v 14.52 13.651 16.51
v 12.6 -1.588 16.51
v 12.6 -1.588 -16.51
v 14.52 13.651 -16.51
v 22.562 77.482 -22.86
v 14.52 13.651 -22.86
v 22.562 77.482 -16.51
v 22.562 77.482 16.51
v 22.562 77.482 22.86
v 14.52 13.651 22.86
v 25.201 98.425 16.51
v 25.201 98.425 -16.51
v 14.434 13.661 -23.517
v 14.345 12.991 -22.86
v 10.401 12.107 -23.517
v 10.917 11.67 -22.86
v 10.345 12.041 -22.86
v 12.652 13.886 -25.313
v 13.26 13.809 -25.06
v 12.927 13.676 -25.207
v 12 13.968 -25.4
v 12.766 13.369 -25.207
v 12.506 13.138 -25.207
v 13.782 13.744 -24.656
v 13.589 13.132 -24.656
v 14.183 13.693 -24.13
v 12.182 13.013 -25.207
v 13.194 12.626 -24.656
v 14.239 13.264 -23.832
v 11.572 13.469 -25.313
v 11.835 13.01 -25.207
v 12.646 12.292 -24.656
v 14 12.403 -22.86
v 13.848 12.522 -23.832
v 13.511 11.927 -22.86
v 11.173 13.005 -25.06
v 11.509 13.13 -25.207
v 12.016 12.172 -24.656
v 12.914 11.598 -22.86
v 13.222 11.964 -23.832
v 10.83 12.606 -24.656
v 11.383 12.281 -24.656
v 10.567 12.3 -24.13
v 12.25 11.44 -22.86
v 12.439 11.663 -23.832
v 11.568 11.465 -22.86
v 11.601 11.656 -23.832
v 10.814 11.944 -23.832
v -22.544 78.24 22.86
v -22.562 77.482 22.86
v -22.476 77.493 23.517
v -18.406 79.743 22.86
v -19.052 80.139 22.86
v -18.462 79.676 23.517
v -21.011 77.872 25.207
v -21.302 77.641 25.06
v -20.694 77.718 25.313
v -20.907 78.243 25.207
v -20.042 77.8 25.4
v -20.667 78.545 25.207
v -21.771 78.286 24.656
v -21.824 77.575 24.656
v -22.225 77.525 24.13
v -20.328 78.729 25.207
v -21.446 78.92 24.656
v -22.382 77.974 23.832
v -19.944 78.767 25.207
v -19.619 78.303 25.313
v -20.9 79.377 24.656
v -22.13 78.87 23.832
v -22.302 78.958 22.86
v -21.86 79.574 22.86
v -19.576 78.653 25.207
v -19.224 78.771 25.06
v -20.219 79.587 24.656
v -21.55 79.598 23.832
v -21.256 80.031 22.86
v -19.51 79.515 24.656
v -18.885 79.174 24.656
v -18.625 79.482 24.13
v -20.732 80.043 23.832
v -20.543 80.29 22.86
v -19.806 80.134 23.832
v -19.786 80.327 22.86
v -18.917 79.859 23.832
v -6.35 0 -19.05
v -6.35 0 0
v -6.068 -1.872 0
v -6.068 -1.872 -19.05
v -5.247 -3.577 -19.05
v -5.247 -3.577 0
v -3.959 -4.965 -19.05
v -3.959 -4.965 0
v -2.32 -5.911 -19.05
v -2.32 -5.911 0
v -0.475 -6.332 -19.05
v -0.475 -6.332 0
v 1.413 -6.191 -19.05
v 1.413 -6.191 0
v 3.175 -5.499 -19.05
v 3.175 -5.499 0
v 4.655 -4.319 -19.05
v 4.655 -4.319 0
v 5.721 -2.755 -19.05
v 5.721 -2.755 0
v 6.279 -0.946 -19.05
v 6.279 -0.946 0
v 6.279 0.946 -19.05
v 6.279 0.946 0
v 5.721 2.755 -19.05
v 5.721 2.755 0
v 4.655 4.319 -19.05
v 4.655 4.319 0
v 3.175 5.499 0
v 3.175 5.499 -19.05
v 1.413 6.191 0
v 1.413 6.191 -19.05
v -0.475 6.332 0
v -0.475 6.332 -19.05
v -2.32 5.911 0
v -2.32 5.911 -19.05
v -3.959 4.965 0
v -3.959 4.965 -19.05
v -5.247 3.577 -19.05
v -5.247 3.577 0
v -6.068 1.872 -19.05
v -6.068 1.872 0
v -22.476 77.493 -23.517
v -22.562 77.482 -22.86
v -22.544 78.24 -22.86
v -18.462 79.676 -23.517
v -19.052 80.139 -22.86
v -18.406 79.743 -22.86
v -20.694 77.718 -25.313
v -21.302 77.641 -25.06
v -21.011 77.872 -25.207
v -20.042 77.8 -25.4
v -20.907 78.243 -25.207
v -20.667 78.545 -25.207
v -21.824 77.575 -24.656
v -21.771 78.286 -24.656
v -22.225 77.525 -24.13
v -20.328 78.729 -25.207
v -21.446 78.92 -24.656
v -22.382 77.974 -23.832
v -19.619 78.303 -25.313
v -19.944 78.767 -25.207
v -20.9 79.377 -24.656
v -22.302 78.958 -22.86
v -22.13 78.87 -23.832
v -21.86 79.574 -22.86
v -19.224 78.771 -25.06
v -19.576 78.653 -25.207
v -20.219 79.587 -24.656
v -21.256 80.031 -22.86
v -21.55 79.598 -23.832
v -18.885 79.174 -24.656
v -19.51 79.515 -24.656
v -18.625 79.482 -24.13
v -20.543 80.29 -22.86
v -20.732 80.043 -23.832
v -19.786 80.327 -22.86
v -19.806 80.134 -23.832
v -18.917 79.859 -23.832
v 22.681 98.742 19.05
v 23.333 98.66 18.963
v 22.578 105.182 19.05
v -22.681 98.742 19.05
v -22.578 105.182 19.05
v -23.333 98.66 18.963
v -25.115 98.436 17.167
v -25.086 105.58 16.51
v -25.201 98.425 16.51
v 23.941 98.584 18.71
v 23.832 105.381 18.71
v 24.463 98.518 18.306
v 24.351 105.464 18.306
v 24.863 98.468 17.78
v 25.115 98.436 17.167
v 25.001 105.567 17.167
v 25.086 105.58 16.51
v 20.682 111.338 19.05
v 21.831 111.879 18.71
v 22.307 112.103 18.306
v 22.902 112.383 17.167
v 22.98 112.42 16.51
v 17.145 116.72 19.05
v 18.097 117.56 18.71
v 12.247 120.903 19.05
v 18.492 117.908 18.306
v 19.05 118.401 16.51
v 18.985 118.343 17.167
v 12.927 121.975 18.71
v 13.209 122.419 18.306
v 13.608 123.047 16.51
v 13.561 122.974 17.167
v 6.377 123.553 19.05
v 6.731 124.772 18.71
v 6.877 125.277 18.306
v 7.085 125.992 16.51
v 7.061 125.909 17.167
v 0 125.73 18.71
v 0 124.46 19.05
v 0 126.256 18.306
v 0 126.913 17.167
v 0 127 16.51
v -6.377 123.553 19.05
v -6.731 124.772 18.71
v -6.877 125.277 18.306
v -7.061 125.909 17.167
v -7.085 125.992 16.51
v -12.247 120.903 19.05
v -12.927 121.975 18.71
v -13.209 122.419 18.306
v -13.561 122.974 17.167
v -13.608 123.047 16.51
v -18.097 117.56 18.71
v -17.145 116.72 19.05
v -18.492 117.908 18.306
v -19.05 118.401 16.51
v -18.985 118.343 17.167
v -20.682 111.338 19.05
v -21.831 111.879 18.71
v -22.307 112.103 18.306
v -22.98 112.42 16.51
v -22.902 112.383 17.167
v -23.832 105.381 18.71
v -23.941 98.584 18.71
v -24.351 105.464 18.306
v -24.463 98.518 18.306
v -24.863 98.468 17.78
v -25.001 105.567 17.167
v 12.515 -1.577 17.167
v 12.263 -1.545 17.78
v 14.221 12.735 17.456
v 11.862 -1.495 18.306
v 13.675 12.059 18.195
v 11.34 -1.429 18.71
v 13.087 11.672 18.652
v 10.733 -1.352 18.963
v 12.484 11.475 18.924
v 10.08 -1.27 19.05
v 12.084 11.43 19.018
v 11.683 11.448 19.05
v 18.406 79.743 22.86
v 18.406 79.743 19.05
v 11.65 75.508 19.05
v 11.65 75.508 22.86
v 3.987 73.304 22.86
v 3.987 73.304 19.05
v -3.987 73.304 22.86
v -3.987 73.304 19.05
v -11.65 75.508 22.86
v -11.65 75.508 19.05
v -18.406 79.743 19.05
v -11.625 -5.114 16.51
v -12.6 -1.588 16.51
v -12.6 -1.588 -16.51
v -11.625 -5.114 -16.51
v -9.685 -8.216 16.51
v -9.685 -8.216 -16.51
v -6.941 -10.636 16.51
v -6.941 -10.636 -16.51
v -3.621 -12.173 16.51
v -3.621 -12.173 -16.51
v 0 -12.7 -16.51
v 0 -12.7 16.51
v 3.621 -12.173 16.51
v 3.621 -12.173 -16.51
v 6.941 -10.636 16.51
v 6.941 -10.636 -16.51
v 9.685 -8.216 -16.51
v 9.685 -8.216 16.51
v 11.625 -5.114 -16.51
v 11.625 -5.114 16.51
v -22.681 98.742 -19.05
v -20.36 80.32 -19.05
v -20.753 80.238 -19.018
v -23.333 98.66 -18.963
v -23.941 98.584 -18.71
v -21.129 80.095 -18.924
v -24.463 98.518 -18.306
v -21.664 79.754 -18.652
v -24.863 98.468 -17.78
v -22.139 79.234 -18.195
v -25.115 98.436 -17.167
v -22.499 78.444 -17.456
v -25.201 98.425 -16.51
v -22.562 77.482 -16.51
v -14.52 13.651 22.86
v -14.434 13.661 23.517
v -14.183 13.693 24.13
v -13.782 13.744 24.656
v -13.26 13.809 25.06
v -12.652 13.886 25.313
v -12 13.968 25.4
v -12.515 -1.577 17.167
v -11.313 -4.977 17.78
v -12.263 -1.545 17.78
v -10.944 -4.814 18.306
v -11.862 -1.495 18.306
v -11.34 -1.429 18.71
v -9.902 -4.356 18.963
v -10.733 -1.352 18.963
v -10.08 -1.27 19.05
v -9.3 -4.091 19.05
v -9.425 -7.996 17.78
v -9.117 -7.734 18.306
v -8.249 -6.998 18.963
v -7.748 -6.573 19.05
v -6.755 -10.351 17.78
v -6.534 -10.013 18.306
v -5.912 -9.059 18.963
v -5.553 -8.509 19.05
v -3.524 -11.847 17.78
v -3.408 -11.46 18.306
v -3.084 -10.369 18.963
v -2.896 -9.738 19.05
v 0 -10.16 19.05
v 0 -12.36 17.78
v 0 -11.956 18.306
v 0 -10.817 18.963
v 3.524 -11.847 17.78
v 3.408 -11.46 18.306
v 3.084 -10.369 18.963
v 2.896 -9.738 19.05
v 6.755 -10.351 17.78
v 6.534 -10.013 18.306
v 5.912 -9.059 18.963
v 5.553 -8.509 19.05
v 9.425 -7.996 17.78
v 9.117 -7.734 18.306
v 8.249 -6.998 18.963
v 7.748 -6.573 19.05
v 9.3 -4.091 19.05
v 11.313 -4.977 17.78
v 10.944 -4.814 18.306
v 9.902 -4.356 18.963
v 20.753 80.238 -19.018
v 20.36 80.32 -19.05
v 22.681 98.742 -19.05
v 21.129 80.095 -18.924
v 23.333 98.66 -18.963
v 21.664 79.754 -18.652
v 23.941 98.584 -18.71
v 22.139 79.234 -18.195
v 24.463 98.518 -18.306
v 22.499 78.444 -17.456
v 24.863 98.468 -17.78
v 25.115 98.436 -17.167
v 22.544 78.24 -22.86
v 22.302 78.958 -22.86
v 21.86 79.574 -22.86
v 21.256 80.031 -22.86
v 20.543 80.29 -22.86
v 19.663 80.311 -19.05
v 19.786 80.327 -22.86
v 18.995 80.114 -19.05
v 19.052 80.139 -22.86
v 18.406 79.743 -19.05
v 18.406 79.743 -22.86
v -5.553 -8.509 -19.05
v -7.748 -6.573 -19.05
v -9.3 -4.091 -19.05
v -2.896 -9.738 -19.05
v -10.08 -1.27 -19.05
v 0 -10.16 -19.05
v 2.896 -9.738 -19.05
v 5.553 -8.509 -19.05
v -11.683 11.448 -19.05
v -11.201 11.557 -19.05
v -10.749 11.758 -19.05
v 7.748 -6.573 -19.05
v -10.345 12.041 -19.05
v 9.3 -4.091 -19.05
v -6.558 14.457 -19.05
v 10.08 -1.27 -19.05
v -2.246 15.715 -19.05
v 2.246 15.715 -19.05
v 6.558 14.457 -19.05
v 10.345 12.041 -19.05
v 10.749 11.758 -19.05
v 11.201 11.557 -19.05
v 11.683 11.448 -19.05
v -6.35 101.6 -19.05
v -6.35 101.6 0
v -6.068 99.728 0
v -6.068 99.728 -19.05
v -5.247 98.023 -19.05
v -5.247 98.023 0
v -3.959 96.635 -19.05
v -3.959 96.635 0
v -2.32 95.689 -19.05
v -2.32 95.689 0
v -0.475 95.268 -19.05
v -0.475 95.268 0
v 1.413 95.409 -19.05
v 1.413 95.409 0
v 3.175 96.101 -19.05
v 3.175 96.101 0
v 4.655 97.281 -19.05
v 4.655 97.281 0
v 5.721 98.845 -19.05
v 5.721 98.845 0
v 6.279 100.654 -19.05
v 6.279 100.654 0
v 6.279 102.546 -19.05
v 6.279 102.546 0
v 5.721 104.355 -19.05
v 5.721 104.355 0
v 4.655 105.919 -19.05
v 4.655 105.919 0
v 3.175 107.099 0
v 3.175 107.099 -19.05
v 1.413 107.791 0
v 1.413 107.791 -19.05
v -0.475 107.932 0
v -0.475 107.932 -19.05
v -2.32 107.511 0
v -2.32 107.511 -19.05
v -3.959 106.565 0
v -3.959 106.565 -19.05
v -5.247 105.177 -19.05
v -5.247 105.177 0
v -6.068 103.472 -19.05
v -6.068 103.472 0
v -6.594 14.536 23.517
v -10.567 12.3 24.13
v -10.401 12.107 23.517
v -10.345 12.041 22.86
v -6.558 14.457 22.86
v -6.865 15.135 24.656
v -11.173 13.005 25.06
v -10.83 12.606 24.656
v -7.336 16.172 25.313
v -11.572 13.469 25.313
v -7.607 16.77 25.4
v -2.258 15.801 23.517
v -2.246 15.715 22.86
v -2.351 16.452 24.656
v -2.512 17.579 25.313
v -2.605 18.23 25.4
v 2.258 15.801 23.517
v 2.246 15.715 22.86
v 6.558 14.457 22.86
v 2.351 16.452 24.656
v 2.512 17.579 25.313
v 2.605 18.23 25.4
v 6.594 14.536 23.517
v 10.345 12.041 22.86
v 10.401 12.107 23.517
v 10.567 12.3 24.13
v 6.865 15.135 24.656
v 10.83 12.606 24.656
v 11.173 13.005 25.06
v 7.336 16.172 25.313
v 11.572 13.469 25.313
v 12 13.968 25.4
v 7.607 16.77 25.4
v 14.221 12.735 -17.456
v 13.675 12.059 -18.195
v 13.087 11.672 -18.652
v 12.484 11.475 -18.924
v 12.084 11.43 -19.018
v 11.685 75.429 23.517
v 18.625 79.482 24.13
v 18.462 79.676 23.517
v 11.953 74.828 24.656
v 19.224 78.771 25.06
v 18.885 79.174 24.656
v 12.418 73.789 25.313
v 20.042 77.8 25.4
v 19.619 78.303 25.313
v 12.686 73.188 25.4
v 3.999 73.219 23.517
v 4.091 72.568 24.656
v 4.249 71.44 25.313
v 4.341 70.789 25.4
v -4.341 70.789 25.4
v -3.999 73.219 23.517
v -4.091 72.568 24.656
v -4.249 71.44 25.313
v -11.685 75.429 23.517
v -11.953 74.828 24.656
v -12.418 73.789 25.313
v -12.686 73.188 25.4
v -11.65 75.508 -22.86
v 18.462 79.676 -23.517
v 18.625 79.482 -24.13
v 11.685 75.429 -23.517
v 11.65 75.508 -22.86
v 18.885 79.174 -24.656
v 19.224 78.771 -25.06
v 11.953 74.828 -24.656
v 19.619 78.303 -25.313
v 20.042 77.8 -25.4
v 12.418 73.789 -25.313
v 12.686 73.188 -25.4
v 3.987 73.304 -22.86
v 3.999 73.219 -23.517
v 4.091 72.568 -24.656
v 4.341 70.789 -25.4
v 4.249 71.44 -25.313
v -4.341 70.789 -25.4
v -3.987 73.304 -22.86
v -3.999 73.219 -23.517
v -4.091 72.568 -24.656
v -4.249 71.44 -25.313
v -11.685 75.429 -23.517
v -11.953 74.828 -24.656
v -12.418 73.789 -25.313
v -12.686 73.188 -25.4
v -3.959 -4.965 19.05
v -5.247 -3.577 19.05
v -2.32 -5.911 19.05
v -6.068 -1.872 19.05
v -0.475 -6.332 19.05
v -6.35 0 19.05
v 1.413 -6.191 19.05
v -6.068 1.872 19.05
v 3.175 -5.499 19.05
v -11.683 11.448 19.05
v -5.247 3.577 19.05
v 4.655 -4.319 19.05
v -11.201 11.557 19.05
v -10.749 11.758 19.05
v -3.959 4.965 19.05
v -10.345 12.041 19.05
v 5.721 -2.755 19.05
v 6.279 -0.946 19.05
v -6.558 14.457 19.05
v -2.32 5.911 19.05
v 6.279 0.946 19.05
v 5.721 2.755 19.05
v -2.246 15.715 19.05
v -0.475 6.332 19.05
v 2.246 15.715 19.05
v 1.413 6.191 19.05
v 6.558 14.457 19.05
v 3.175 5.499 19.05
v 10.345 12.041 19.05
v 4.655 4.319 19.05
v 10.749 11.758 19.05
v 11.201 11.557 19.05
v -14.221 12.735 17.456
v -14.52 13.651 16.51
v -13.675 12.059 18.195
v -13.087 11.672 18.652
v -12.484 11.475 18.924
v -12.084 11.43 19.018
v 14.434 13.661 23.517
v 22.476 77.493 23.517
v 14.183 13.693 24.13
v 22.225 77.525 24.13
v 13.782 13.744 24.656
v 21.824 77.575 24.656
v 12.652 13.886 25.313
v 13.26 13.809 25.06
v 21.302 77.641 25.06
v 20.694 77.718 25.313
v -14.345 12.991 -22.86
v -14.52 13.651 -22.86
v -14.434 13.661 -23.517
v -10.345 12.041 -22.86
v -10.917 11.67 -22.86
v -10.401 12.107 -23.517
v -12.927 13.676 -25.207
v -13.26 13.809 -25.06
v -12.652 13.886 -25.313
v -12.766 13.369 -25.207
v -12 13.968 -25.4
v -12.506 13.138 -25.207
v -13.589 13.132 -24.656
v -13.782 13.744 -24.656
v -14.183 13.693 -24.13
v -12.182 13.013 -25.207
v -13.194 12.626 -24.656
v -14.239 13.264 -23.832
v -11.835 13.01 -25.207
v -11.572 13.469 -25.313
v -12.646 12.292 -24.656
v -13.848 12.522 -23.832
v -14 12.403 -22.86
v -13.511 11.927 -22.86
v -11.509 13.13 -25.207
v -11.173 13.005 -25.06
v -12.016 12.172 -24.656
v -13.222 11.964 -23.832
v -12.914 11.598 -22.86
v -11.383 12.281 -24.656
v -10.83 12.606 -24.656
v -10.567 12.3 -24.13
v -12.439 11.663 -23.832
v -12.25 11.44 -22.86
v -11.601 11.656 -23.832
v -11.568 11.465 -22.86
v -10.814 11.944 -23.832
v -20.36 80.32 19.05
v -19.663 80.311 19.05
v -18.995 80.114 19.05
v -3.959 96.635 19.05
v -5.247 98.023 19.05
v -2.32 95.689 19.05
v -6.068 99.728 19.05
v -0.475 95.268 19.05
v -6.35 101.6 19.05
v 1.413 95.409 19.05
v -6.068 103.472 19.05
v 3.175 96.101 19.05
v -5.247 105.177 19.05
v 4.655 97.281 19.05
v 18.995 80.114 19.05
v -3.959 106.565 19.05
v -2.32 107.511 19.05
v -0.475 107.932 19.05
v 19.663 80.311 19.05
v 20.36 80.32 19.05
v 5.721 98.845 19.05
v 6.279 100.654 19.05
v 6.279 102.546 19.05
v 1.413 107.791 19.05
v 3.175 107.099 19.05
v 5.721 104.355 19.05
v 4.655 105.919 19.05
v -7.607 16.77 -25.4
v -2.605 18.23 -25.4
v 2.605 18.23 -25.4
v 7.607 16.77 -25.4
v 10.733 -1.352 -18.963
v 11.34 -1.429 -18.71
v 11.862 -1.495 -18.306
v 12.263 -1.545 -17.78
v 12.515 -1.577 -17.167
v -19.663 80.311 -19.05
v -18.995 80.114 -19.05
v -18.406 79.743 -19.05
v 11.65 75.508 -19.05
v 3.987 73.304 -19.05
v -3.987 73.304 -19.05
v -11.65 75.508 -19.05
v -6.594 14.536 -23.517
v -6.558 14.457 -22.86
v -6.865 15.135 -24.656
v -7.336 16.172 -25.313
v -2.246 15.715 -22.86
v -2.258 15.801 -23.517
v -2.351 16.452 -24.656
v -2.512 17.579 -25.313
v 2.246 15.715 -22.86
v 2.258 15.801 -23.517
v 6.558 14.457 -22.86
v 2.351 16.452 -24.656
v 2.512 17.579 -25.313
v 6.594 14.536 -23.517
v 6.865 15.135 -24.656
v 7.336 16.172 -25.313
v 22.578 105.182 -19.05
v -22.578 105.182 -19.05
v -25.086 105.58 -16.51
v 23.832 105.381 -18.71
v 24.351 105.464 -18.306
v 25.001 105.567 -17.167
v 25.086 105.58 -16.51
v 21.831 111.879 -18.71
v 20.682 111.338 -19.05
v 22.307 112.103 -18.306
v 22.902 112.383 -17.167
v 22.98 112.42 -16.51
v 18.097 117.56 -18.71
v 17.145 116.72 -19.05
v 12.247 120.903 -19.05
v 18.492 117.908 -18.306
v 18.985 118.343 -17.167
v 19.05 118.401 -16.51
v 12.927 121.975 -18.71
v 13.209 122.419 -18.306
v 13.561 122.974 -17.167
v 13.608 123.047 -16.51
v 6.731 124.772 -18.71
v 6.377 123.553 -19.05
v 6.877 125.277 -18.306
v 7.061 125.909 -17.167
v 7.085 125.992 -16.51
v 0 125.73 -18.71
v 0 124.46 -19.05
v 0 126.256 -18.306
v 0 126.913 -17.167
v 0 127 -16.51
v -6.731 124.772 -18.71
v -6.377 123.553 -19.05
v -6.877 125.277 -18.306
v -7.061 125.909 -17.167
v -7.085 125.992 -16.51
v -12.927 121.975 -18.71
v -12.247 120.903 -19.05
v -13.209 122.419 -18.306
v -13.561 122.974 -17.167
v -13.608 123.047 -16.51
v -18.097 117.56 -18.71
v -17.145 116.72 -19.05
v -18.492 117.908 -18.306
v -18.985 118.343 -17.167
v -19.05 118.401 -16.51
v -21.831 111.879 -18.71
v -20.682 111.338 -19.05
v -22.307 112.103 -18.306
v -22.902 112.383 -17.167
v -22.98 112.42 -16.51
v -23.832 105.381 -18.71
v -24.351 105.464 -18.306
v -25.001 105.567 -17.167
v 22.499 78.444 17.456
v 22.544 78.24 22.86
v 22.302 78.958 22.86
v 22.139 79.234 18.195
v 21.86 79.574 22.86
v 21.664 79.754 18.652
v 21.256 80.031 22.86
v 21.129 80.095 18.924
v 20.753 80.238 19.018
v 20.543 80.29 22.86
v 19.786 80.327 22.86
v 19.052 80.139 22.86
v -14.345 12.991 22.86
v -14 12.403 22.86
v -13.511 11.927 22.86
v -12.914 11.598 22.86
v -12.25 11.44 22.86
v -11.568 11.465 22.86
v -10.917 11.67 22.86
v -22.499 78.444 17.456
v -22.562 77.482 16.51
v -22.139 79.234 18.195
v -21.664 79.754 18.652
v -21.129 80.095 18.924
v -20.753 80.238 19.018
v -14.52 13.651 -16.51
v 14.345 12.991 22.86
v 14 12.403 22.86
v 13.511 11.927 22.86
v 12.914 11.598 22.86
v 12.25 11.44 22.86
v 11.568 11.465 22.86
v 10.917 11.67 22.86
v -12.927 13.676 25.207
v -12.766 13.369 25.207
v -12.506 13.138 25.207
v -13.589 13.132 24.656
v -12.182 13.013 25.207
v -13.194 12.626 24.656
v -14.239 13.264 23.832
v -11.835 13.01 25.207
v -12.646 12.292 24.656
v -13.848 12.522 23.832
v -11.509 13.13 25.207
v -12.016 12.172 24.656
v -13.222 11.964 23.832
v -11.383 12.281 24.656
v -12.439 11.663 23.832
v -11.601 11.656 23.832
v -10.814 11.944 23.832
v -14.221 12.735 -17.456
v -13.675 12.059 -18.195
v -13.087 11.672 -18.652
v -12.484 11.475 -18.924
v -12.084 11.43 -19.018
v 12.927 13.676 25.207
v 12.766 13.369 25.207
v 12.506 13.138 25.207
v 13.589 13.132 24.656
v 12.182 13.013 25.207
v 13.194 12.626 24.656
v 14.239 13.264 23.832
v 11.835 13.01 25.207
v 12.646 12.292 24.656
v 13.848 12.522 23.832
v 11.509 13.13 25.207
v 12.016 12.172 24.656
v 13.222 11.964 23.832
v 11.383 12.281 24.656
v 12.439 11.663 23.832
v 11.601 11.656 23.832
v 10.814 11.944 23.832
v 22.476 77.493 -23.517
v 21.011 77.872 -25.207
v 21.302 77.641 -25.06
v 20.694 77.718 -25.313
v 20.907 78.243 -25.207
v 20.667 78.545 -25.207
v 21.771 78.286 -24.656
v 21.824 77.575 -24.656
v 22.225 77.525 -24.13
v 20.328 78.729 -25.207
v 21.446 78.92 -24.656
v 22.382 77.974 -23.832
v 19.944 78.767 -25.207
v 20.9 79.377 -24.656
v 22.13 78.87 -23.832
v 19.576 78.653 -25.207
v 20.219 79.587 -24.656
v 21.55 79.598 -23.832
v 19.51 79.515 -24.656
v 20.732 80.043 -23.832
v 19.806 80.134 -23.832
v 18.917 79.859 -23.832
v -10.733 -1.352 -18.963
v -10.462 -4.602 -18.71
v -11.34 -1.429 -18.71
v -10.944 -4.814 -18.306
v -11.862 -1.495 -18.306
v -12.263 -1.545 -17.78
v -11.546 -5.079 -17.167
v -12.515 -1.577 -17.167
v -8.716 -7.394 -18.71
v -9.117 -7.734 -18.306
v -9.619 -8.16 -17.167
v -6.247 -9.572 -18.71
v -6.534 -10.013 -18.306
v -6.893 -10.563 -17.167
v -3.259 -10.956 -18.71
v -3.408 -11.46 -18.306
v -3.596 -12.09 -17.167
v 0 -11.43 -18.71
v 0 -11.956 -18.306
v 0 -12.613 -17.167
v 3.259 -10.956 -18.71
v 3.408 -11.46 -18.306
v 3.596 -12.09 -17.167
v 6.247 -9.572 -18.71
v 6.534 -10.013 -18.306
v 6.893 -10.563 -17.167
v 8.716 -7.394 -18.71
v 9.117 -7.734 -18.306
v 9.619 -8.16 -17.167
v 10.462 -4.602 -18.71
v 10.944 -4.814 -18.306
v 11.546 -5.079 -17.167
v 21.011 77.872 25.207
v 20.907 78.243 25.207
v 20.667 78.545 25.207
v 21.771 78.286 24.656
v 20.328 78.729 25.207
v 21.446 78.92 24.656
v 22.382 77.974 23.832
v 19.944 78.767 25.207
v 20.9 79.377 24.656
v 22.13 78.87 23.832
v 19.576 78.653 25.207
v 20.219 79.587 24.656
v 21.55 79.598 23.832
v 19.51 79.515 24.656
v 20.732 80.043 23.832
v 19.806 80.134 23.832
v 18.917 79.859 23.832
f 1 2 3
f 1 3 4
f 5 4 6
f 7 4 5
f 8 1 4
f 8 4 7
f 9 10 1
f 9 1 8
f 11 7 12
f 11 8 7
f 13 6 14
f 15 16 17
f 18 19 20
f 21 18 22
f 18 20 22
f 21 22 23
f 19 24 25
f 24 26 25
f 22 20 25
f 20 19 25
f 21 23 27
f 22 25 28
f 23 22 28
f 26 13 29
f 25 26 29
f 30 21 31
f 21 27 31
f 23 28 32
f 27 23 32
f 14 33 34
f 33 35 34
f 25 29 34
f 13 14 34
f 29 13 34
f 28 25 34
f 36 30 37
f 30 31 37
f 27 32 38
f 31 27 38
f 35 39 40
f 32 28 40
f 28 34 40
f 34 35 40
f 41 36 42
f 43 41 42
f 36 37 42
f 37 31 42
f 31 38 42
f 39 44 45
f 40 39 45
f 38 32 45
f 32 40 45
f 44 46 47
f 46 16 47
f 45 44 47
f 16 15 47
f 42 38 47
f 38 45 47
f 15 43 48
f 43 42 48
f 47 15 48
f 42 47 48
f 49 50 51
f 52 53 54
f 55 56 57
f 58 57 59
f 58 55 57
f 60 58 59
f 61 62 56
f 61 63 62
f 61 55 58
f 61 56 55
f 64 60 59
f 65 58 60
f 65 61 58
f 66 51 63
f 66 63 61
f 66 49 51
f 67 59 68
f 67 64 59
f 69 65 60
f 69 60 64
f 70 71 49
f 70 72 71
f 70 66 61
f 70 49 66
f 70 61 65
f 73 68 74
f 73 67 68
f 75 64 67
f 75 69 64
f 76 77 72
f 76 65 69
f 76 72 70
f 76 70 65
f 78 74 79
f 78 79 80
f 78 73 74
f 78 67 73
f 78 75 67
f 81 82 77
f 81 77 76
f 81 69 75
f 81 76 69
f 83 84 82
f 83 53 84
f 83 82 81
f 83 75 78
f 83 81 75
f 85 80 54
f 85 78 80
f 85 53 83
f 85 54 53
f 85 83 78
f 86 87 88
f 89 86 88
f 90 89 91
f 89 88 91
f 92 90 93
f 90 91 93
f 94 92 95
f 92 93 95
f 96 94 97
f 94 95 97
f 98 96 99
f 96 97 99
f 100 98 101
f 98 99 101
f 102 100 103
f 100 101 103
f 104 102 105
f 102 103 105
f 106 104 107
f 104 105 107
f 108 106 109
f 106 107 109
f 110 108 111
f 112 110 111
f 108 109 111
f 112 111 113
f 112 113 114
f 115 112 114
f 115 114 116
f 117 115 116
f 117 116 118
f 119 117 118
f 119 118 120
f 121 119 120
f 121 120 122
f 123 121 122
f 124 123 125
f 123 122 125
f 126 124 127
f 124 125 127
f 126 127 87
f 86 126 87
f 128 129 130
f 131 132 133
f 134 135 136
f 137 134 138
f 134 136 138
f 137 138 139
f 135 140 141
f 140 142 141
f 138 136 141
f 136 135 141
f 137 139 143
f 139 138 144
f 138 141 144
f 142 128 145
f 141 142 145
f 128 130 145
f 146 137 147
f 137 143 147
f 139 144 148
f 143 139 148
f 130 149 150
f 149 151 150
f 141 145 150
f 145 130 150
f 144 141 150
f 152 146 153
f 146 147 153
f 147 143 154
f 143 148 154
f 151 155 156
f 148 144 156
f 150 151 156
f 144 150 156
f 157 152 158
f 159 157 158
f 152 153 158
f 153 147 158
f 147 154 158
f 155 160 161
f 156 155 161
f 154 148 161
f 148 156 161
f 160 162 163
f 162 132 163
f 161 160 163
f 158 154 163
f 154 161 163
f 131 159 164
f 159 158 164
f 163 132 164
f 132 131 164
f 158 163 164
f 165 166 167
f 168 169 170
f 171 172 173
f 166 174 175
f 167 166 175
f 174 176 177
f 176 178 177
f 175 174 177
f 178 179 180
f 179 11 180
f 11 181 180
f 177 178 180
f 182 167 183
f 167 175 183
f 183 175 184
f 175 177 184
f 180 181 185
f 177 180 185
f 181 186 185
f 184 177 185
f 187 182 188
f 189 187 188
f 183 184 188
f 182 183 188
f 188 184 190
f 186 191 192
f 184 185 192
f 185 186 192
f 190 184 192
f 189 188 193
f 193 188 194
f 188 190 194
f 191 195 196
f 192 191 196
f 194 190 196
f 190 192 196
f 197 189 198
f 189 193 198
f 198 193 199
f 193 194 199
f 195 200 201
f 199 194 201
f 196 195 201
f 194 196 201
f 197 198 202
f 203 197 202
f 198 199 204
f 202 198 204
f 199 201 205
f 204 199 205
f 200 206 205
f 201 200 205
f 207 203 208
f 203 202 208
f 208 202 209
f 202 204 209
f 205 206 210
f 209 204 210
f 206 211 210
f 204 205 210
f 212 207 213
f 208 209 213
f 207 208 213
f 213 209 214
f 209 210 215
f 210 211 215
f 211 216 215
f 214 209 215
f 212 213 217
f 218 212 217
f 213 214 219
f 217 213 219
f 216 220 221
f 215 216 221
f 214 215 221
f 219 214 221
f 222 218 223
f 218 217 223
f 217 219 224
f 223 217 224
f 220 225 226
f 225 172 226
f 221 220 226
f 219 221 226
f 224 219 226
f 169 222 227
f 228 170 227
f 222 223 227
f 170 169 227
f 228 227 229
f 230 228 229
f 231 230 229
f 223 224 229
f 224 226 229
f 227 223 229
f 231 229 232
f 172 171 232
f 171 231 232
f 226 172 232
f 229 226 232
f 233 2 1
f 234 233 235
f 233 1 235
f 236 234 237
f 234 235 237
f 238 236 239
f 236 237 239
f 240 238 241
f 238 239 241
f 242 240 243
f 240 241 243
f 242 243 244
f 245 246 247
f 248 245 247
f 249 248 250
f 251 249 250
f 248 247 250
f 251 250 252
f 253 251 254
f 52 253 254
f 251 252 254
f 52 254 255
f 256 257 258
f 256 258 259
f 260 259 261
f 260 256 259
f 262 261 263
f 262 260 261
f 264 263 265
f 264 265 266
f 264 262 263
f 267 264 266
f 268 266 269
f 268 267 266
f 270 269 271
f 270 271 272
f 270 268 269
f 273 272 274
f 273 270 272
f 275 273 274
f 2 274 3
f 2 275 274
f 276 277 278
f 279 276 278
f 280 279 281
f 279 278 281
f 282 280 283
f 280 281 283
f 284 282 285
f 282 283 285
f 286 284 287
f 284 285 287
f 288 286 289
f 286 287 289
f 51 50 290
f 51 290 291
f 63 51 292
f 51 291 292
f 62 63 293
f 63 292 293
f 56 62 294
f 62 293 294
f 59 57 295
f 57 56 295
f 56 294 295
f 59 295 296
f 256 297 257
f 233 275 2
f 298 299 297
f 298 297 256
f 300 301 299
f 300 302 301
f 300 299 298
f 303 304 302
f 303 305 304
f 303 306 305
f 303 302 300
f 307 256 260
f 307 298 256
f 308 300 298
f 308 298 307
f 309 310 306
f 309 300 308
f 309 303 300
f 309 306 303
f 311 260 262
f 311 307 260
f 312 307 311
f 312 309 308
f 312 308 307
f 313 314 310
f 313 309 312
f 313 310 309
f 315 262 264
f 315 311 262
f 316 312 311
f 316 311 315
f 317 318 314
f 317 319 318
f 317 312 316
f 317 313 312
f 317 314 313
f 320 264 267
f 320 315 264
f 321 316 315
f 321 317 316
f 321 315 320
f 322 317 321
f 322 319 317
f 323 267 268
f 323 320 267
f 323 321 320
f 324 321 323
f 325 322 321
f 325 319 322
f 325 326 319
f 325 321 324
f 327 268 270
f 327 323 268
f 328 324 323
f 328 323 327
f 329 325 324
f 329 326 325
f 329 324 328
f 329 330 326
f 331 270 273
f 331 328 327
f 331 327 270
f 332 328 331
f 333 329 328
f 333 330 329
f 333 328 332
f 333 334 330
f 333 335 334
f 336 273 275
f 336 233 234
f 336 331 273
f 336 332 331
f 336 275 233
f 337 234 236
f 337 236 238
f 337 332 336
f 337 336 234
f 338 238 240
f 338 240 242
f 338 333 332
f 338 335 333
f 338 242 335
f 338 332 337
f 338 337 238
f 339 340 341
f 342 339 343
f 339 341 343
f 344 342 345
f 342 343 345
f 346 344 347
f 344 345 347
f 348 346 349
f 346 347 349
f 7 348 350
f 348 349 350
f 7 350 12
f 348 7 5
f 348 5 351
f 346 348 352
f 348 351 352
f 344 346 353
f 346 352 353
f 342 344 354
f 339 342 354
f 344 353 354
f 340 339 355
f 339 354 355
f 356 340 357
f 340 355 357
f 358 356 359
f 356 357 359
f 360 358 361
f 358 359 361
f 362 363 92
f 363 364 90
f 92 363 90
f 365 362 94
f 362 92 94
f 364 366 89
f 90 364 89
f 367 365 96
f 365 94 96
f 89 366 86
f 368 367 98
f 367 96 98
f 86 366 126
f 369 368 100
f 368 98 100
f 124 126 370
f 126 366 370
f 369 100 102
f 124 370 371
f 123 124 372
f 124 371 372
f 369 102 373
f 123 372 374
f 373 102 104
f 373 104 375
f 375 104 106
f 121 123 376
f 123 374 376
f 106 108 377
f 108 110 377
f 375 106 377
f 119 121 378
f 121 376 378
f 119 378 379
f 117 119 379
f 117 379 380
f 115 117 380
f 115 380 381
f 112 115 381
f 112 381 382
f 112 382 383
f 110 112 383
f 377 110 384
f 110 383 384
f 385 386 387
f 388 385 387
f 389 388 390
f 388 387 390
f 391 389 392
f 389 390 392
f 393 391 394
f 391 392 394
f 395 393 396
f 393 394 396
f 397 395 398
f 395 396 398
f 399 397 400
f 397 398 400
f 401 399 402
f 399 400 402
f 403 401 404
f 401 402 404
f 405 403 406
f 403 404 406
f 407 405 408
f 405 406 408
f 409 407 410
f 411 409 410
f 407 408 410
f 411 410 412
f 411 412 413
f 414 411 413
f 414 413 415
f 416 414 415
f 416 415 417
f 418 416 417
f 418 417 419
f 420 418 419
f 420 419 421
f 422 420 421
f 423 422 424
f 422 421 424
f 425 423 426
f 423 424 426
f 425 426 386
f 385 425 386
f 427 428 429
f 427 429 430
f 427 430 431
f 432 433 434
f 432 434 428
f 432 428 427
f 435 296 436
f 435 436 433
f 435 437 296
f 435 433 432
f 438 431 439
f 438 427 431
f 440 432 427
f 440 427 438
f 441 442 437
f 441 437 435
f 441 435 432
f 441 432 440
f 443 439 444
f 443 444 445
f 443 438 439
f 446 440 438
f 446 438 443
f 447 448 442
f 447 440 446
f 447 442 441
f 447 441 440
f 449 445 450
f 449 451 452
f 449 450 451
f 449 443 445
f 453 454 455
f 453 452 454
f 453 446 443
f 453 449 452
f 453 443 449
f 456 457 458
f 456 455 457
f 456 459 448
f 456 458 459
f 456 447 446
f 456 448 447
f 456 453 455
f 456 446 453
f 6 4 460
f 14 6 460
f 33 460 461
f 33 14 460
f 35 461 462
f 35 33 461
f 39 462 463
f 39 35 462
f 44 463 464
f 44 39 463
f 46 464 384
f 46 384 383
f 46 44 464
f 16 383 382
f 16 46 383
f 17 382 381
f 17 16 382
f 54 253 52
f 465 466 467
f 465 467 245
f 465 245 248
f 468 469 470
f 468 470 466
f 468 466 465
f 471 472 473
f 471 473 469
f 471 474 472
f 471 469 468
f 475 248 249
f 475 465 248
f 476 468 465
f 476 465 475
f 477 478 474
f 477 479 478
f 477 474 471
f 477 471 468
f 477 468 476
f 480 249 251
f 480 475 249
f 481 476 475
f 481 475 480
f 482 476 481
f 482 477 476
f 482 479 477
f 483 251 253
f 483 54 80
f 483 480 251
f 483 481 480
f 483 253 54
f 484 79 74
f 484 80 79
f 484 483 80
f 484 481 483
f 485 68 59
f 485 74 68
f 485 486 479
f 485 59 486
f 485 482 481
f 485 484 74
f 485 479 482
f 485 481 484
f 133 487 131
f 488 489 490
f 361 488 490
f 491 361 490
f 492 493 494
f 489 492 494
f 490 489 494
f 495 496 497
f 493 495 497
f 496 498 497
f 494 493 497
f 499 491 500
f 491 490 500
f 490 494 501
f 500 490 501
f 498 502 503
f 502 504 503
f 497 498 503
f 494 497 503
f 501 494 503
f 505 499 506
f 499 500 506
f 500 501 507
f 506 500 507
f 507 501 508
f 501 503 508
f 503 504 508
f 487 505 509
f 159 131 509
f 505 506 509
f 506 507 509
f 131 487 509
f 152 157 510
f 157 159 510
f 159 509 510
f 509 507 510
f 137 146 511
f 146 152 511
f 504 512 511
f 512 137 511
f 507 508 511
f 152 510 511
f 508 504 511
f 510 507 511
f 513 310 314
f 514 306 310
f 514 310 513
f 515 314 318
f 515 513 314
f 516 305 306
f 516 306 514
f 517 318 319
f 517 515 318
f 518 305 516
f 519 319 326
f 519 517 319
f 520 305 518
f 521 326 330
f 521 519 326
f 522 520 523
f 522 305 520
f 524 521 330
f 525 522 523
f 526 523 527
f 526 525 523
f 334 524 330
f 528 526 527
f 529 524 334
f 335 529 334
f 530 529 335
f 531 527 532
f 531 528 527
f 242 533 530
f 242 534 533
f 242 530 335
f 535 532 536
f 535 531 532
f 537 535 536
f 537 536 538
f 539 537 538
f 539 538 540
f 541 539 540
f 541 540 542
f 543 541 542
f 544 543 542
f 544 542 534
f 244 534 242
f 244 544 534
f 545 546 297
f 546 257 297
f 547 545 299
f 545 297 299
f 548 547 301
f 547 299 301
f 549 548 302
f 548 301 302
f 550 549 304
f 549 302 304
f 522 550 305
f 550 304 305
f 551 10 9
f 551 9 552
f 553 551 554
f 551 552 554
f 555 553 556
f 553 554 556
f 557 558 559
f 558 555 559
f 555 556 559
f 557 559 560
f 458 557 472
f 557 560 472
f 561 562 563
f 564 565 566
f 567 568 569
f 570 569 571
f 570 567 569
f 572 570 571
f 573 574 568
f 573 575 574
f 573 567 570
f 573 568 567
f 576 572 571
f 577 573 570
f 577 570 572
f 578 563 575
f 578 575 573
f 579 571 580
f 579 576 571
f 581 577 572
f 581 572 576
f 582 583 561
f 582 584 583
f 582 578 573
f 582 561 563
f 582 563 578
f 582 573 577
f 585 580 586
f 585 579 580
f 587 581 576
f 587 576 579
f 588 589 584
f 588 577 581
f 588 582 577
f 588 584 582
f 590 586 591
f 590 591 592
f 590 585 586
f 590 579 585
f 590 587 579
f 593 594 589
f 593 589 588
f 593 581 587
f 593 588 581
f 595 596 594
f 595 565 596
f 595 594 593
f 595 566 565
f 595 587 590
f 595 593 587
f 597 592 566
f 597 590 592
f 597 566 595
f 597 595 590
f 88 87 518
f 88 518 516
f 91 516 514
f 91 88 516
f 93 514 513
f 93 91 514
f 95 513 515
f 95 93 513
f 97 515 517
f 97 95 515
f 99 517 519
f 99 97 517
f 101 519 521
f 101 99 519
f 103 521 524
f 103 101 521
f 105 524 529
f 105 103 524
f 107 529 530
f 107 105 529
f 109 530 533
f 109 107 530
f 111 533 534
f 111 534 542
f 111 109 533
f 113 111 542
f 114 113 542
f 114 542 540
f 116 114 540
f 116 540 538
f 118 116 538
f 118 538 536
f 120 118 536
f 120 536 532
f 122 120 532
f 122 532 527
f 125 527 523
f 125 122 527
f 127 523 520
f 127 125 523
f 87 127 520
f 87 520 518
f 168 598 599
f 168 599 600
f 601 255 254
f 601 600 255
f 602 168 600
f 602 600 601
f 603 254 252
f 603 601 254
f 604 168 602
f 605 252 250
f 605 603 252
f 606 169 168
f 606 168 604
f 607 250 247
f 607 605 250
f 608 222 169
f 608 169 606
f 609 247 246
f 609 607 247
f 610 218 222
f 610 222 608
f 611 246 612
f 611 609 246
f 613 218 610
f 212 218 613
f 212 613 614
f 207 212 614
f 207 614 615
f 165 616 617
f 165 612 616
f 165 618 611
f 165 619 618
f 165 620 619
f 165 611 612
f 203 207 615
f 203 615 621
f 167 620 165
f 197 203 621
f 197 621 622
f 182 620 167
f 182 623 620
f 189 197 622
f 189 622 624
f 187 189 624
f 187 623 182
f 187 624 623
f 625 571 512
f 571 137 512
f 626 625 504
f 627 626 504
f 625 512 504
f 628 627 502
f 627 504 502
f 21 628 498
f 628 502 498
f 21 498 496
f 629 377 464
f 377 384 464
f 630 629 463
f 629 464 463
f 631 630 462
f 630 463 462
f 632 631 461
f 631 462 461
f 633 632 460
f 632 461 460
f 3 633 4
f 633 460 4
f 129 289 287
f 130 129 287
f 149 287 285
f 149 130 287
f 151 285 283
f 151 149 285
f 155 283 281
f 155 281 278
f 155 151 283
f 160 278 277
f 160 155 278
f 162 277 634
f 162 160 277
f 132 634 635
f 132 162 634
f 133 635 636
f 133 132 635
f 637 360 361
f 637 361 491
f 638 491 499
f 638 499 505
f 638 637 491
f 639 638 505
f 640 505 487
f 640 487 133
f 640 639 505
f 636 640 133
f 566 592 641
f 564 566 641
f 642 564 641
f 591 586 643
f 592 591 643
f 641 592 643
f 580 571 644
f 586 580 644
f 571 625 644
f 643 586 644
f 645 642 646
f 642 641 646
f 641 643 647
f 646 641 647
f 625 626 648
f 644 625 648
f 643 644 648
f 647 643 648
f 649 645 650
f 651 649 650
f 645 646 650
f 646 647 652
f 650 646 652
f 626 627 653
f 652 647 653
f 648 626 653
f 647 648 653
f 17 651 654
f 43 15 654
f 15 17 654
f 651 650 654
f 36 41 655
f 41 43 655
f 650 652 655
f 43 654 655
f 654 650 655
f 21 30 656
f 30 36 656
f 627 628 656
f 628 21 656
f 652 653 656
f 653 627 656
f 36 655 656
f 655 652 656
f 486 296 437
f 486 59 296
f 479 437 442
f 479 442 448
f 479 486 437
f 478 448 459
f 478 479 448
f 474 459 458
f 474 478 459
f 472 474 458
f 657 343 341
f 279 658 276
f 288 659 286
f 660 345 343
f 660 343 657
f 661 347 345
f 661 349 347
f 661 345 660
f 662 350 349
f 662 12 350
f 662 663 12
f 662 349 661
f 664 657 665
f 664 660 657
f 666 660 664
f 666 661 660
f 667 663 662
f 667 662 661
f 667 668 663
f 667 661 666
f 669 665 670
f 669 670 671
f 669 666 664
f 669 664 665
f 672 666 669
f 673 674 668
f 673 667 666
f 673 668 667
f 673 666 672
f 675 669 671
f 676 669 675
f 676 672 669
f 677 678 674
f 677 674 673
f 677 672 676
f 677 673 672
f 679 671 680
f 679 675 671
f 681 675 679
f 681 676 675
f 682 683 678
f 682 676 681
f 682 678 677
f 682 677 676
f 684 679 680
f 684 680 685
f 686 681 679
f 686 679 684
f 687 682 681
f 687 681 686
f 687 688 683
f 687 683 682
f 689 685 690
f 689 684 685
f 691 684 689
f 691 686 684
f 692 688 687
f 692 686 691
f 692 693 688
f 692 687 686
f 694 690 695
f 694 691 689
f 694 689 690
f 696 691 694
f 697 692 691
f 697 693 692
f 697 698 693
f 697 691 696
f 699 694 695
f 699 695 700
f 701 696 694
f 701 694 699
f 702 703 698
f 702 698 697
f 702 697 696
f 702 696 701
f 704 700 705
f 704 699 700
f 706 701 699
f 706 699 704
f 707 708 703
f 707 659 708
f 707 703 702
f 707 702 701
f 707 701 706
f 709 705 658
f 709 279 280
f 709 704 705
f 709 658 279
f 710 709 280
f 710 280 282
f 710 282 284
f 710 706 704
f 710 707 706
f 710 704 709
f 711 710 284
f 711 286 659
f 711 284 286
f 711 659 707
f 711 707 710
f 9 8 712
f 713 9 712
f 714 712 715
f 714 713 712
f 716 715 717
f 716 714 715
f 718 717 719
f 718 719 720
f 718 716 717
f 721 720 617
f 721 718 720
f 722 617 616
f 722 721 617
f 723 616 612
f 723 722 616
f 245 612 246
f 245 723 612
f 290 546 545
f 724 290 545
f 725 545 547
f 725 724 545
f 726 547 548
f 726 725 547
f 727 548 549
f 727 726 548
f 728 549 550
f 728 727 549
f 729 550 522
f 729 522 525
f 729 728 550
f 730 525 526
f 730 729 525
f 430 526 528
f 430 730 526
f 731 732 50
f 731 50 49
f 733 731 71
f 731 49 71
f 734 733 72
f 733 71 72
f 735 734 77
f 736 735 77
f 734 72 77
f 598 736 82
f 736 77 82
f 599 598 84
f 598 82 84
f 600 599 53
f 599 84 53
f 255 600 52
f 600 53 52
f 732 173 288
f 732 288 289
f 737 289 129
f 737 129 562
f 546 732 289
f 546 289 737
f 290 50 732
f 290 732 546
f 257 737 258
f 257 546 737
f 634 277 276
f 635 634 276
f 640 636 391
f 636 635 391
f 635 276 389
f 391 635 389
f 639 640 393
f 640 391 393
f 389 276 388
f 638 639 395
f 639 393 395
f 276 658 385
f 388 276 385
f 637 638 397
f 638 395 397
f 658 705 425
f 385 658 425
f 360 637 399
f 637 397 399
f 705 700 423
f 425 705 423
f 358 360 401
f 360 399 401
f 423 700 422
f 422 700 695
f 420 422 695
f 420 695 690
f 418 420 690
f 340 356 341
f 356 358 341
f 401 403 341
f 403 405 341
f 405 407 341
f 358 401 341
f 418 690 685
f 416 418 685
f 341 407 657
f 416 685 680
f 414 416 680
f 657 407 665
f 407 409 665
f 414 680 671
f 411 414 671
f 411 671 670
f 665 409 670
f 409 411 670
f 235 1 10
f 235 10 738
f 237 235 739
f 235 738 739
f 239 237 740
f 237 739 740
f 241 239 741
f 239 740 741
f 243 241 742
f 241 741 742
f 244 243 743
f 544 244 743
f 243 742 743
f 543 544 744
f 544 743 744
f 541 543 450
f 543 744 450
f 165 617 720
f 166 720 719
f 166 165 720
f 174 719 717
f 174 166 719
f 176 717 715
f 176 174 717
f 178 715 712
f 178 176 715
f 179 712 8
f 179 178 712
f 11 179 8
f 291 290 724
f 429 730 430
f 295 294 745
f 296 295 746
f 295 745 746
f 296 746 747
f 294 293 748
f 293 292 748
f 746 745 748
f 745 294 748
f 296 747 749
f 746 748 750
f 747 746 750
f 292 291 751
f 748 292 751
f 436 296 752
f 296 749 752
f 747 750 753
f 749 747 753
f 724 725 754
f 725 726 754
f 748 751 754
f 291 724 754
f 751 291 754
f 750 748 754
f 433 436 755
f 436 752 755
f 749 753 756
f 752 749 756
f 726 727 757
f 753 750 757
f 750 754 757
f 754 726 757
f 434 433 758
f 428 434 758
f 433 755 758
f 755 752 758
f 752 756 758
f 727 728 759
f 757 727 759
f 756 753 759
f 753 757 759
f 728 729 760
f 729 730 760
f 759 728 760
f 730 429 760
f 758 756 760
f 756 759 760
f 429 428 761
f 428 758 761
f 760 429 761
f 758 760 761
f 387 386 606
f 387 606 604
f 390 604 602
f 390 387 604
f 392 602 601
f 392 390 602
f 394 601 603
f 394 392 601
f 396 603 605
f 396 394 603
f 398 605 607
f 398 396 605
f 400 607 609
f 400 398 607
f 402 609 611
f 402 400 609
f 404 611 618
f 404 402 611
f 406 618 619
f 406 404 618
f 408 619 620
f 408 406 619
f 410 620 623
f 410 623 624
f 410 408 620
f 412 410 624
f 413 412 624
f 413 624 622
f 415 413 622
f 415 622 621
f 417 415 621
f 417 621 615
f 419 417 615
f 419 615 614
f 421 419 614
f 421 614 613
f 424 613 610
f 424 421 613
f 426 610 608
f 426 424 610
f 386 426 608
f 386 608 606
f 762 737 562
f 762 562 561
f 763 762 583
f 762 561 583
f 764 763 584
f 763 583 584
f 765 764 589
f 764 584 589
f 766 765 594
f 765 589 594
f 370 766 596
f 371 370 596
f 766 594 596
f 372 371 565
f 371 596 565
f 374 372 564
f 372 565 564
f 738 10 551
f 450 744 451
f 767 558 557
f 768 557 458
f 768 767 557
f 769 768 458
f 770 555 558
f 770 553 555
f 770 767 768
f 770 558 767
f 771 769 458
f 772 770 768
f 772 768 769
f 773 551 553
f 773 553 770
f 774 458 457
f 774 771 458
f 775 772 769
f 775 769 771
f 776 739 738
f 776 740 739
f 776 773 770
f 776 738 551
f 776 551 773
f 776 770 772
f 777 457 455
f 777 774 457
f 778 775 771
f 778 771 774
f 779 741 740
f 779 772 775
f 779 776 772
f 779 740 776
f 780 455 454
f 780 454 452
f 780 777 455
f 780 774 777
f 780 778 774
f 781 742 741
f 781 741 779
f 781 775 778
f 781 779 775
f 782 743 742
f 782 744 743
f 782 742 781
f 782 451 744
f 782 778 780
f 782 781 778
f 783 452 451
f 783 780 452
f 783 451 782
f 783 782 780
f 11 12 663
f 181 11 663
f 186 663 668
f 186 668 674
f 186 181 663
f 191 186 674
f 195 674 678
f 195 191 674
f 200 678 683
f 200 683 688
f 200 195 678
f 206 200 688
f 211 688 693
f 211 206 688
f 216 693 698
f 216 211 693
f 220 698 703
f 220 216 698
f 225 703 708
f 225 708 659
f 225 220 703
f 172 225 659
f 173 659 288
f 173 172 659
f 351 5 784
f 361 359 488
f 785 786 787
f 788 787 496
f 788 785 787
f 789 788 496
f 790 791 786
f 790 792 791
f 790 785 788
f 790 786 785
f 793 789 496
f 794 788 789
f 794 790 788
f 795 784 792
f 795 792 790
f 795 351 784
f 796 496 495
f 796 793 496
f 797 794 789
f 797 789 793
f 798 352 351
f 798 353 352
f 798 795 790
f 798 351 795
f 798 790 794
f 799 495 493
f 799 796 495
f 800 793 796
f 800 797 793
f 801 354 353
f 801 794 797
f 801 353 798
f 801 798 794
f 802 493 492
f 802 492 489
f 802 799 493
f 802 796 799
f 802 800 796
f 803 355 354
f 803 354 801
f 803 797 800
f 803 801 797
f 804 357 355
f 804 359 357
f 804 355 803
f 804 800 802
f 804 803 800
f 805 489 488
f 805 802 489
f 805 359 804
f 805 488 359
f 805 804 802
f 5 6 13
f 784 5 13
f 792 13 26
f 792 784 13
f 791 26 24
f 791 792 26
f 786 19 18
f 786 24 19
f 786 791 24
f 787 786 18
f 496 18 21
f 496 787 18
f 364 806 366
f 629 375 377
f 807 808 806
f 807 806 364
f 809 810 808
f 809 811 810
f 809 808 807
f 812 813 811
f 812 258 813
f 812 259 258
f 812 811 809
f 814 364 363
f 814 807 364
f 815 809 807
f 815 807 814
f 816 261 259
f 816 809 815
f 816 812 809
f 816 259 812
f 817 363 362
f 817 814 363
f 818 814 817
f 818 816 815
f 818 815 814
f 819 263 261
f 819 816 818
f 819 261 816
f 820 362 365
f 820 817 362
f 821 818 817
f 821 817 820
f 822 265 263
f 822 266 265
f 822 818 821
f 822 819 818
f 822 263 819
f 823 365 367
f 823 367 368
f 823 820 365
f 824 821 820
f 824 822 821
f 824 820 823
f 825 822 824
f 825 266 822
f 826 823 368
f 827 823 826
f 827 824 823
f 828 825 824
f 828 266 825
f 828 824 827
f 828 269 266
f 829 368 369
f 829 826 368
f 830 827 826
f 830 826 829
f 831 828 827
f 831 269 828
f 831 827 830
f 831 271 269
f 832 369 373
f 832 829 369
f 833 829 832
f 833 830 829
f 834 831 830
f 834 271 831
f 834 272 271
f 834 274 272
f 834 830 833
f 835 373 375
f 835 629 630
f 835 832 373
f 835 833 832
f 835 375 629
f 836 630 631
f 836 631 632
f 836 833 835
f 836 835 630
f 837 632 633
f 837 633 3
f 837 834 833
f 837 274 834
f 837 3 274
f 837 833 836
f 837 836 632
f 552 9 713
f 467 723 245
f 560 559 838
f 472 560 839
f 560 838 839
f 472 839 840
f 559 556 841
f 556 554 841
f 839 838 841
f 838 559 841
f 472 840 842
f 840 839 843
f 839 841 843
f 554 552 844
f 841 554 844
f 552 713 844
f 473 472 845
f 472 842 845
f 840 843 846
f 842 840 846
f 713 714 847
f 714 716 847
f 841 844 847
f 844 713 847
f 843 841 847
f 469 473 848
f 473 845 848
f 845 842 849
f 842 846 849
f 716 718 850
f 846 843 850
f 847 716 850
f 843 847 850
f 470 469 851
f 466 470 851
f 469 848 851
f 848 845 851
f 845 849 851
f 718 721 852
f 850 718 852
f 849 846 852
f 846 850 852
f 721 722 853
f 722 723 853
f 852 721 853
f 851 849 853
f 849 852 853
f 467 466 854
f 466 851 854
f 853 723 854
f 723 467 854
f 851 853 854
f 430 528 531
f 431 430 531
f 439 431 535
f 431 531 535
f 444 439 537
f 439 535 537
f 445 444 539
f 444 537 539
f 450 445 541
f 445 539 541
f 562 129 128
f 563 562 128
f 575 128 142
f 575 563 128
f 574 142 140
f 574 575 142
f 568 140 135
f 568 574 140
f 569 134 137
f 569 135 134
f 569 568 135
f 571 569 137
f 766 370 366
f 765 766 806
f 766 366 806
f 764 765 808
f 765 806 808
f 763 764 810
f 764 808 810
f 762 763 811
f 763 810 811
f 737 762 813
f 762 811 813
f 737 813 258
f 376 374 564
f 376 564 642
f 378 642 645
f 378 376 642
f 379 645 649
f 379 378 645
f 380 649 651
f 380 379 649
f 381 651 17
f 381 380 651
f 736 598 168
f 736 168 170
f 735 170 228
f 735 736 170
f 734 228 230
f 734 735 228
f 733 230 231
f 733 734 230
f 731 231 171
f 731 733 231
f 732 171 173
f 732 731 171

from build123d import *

# Parameters (mm, degrees)
SKETCH1_R            = 6.35
SKETCH1_R_2          = 6.349999999999998
BOSS_EXTRUDE1_DEPTH  = 19.05
BOSS_EXTRUDE2_DEPTH  = 6.35
FILLET1_R            = 2.54
FILLET1_OF_MIRROR4_R = 2.54


with BuildPart() as part:
    # Sketch1 → Boss-Extrude1 (new body)
    with BuildSketch(Plane.XY):
        with BuildLine():
            Line((-25.20078123789022, 98.425), (-12.600390618945115, -1.5875000000000004))
            ThreePointArc((-12.600390618945115, -1.5875000000000004), (7.8e-16, -12.700000000000003), (12.600390618945115, -1.5875000000000004))
            Line((12.600390618945115, -1.5875000000000004), (25.20078123789022, 98.425))
            ThreePointArc((25.20078123789022, 98.425), (-4.67e-15, 126.99999999999999), (-25.20078123789022, 98.425))
        make_face()
        with Locations(Location((0, 0, 0), (0, 0, 180))):
            Circle(SKETCH1_R, mode=Mode.SUBTRACT)
        with Locations(Location((0, 101.6, 0), (0, 0, 180))):
            Circle(SKETCH1_R_2, mode=Mode.SUBTRACT)
    boss_extrude1 = extrude(amount=BOSS_EXTRUDE1_DEPTH)

    # Sketch2 → Boss-Extrude2 (add)
    with BuildSketch(Plane.XY.offset(19.05)):
        with BuildLine():
            Line((-23.56442369272321, 85.43681463851183), (-13.791015618945115, 7.862792964208833))
            ThreePointArc((-13.791015618945114, 7.8627929642088334), (-2.55e-15, 15.875), (13.791015618945112, 7.862792964208835))
            Line((13.791015618945114, 7.862792964208836), (23.56442369272321, 85.43681463851183))
            ThreePointArc((23.564423692723203, 85.43681463851182), (-5.25e-15, 73.02499999999999), (-23.56442369272321, 85.43681463851183))
        make_face()
    boss_extrude2 = extrude(amount=BOSS_EXTRUDE2_DEPTH)

    # Fillet1
    fillet1_edges = [part.edges().sort_by_distance(p)[0] for p in [
        (-2.22e-15, -12.700000000000003, 19.05),
        (13.195703118945115, 3.137646482104417, 19.05),
        (-13.195703118945115, 3.137646482104415, 19.05),
        (24.382602465306718, 91.93090731925592, 19.05),
        (8.9e-16, 15.875000000000002, 25.4),
        (-13.791015618945114, 7.862792964208833, 22.225),
        (13.791015618945114, 7.862792964208834, 22.225),
        (-1.066e-14, 73.02499999999999, 25.4),
        (23.564423692723206, 85.43681463851183, 22.225),
        (-23.564423692723214, 85.43681463851183, 22.225),
        (18.67771965583416, 46.649803801360335, 25.4),
        (-18.677719655834164, 46.649803801360335, 25.4),
        (-3.11e-15, 126.99999999999999, 19.05),
        (-24.382602465306714, 91.93090731925591, 19.05),
    ]]
    fillet(fillet1_edges, radius=FILLET1_R)

    # Mirror4: Boss-Extrude1, Boss-Extrude2 across plane
    add(boss_extrude1.mirror(Plane(origin=(0, 101.6, 0), x_dir=(1, 0, 0), z_dir=(0, 0, -1))))
    add(boss_extrude2.mirror(Plane(origin=(0, 101.6, 0), x_dir=(1, 0, 0), z_dir=(0, 0, -1))))

    # Fillet1 of Mirror4
    fillet1_of_mirror4_edges = [part.edges().sort_by_distance(p)[0] for p in [
        (-2.22e-15, -12.700000000000003, -19.05),
        (13.195703118945115, 3.137646482104417, -19.05),
        (-13.195703118945115, 3.137646482104415, -19.05),
        (24.382602465306718, 91.93090731925592, -19.05),
        (8.9e-16, 15.875000000000002, -25.4),
        (-13.791015618945114, 7.862792964208833, -22.225),
        (13.791015618945114, 7.862792964208834, -22.225),
        (-1.066e-14, 73.02499999999999, -25.4),
        (23.564423692723206, 85.43681463851183, -22.225),
        (-23.564423692723214, 85.43681463851183, -22.225),
        (18.67771965583416, 46.649803801360335, -25.4),
        (-18.677719655834164, 46.649803801360335, -25.4),
        (-3.11e-15, 126.99999999999999, -19.05),
        (-24.382602465306714, 91.93090731925591, -19.05),
    ]]
    fillet(fillet1_of_mirror4_edges, radius=FILLET1_OF_MIRROR4_R)


solid = part.part
